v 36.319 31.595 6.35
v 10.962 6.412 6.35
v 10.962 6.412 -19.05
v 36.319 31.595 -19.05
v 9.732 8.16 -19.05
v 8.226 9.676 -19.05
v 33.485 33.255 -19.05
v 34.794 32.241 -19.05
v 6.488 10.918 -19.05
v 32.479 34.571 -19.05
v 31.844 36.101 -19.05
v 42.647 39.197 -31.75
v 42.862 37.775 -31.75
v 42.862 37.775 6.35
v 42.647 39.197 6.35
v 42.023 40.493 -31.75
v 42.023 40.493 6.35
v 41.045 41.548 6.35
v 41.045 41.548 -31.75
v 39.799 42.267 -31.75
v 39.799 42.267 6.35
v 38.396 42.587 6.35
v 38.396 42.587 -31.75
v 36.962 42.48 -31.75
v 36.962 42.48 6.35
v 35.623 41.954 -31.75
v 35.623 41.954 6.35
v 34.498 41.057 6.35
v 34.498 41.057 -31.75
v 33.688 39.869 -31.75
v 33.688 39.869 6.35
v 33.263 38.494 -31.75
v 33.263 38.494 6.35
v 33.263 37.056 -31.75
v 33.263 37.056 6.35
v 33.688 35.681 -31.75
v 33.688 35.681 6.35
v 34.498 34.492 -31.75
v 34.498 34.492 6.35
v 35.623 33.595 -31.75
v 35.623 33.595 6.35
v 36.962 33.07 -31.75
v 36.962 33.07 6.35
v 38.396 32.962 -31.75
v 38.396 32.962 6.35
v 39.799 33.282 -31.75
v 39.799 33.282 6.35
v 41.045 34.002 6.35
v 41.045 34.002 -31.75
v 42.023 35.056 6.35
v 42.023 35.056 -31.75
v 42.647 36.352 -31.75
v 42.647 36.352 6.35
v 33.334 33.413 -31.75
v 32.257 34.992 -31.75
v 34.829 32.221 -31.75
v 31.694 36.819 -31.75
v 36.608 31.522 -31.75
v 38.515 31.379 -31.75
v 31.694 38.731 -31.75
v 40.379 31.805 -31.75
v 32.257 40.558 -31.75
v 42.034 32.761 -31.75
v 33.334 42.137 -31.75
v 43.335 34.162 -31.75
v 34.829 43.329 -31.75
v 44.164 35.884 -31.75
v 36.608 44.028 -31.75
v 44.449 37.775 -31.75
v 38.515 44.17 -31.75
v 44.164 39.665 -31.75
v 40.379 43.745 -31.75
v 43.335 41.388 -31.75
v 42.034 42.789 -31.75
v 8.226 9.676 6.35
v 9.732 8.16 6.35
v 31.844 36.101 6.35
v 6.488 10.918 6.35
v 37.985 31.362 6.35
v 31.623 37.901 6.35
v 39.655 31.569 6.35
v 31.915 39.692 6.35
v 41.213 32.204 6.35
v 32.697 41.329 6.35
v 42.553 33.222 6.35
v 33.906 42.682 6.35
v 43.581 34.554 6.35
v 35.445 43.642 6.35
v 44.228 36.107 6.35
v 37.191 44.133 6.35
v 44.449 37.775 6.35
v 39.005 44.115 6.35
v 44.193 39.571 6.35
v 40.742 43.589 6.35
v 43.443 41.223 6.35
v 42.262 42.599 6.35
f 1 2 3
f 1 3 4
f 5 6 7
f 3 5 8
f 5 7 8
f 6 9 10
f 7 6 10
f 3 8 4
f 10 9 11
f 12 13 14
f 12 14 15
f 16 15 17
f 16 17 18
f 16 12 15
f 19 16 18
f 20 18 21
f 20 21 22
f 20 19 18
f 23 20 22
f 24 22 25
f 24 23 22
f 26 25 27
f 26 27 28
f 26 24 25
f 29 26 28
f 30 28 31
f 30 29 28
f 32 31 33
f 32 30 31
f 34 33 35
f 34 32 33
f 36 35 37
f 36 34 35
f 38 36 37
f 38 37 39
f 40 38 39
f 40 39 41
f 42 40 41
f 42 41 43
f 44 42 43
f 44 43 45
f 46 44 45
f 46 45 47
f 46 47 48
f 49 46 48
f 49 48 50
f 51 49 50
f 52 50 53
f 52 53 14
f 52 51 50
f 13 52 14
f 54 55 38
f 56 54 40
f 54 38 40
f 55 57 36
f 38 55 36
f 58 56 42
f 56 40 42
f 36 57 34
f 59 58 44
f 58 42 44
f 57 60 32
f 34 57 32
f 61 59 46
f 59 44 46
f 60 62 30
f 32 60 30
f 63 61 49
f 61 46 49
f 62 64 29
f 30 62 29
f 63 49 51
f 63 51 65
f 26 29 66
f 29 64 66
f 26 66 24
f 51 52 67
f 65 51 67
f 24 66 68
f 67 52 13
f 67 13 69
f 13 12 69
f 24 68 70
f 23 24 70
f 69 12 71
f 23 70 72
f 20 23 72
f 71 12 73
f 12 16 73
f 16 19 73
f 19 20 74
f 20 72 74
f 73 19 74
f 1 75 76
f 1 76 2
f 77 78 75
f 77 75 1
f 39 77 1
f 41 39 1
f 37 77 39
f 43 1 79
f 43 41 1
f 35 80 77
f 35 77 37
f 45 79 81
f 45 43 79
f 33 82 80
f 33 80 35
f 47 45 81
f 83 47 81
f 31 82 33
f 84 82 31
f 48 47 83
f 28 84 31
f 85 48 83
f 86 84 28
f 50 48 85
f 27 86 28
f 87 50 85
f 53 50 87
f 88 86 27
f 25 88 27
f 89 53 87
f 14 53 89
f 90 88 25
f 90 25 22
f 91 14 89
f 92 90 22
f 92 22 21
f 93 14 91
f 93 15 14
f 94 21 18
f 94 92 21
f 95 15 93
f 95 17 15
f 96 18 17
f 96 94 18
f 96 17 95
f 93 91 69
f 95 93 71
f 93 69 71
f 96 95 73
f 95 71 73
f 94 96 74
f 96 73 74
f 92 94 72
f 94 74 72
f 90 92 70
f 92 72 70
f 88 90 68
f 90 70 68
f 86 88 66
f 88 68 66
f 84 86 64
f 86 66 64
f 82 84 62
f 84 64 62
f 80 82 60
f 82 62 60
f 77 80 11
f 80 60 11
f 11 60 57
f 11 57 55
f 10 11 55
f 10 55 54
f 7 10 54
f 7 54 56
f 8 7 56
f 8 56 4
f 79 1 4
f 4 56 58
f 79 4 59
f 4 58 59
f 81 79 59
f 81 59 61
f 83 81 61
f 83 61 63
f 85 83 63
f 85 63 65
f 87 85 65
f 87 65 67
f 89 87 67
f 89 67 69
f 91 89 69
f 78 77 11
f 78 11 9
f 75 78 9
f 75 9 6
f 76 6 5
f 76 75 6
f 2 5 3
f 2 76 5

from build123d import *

# Parameters (mm, degrees)
SKETCH2_R      = 6.4135
SKETCH2_R_2    = 4.826
EXTRUDE1_DEPTH = 38.1
EXTRUDE2_DEPTH = 25.4


with BuildPart() as part:
    # Sketch2 → Extrude1 (new body)
    with BuildSketch(Plane.XY.offset(-31.75)):
        with Locations((38.035581748, 37.774829094)):
            Circle(SKETCH2_R)
        with Locations((38.035581748, 37.774829094)):
            Circle(SKETCH2_R_2, mode=Mode.SUBTRACT)
    extrude(amount=EXTRUDE1_DEPTH)

    # Sketch3 → Extrude2 (add)
    with BuildSketch(Plane.XY.offset(6.35)):
        with BuildLine():
            Line((31.844396197, 36.10085068), (6.48762227, 10.917909932))
            ThreePointArc((6.48762227, 10.917909932), (9.011090735, 8.949315268), (10.962279904, 6.412364564))
            Line((10.962279904, 6.412364564), (36.319053831, 31.595305313))
            ThreePointArc((36.319053831, 31.595305313), (33.484980926, 33.255424883), (31.844396197, 36.10085068))
        make_face()
    extrude(amount=-EXTRUDE2_DEPTH)


solid = part.part
